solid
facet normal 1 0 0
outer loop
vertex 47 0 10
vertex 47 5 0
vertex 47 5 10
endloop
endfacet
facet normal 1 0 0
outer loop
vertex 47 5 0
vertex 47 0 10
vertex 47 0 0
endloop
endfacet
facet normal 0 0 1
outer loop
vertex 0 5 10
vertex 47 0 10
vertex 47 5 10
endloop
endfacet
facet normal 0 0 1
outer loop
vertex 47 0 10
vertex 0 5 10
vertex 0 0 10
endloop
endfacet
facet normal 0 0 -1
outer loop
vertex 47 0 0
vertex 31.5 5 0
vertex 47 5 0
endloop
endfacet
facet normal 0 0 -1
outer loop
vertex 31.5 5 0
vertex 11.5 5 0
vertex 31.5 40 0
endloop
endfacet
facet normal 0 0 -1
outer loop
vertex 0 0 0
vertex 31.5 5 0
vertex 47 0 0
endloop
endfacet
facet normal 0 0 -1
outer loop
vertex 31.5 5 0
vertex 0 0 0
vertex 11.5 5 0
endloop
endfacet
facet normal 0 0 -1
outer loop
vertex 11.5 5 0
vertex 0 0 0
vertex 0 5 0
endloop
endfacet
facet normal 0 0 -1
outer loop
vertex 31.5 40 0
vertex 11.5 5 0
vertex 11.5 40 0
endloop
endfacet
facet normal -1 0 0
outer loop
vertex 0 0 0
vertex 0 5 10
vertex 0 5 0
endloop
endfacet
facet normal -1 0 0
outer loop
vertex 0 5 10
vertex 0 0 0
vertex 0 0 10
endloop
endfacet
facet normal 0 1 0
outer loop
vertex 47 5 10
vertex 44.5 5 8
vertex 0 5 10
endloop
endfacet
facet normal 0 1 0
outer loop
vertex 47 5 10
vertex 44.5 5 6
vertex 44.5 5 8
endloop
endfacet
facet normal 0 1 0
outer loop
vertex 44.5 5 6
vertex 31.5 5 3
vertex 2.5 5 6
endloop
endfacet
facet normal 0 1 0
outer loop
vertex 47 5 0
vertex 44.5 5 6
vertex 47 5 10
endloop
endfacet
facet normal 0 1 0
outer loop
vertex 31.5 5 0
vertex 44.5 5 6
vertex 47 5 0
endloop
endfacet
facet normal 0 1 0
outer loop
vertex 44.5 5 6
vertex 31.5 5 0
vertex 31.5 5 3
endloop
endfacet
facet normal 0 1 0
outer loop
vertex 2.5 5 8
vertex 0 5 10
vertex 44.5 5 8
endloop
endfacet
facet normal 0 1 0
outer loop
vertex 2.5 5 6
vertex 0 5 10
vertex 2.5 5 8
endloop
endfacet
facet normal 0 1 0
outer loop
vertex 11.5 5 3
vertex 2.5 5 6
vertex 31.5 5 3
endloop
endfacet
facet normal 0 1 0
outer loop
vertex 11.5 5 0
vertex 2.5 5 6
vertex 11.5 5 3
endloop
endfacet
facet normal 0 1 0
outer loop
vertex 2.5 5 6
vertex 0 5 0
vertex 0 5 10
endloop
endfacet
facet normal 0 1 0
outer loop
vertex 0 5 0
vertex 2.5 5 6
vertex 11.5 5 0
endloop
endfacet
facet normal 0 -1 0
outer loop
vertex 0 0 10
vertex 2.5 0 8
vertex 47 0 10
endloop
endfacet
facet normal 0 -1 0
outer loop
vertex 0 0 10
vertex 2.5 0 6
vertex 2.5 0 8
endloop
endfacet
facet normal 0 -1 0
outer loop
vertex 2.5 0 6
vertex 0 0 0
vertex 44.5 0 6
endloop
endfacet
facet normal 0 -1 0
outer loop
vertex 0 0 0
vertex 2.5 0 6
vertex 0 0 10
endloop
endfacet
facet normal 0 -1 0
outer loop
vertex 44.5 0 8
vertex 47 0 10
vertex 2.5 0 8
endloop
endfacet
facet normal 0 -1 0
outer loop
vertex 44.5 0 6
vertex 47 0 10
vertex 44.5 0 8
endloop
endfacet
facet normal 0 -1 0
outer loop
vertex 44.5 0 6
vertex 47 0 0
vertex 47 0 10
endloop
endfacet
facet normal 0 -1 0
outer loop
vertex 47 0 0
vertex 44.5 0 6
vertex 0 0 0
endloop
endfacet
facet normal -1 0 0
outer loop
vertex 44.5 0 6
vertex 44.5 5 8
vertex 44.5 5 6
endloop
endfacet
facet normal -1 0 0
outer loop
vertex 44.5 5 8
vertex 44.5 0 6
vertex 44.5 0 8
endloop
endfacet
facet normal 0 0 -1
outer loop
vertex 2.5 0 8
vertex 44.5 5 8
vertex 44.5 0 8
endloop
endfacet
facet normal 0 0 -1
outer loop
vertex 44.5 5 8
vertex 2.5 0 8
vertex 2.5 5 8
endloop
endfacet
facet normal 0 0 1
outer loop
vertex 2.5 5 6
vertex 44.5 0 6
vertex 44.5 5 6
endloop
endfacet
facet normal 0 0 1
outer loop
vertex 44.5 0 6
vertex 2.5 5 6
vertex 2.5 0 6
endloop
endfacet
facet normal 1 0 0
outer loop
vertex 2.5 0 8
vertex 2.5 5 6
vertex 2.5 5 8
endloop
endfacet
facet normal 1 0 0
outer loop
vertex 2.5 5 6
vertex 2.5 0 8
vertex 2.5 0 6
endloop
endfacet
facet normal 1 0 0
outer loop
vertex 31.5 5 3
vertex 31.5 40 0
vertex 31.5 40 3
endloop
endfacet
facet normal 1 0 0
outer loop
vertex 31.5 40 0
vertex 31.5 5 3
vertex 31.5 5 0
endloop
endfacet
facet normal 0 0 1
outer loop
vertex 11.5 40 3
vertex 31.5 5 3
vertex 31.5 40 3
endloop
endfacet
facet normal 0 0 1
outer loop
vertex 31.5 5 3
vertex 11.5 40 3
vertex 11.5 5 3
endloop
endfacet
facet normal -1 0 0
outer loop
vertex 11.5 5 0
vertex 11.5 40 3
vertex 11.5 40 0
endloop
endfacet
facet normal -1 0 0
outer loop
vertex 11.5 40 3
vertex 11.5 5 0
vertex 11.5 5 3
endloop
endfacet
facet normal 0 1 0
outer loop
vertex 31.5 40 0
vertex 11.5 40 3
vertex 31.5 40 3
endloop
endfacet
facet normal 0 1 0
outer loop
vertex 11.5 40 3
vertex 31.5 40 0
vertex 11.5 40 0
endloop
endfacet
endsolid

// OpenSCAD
//simple putty knife holder for mounting to a desk or wall

translate([11.5,0,0])
    cube([20,40,3]);

difference(){
    cube([47,5,10]);
    
    translate([2.5,0,6])
        cube([42,6,2]);
    }
